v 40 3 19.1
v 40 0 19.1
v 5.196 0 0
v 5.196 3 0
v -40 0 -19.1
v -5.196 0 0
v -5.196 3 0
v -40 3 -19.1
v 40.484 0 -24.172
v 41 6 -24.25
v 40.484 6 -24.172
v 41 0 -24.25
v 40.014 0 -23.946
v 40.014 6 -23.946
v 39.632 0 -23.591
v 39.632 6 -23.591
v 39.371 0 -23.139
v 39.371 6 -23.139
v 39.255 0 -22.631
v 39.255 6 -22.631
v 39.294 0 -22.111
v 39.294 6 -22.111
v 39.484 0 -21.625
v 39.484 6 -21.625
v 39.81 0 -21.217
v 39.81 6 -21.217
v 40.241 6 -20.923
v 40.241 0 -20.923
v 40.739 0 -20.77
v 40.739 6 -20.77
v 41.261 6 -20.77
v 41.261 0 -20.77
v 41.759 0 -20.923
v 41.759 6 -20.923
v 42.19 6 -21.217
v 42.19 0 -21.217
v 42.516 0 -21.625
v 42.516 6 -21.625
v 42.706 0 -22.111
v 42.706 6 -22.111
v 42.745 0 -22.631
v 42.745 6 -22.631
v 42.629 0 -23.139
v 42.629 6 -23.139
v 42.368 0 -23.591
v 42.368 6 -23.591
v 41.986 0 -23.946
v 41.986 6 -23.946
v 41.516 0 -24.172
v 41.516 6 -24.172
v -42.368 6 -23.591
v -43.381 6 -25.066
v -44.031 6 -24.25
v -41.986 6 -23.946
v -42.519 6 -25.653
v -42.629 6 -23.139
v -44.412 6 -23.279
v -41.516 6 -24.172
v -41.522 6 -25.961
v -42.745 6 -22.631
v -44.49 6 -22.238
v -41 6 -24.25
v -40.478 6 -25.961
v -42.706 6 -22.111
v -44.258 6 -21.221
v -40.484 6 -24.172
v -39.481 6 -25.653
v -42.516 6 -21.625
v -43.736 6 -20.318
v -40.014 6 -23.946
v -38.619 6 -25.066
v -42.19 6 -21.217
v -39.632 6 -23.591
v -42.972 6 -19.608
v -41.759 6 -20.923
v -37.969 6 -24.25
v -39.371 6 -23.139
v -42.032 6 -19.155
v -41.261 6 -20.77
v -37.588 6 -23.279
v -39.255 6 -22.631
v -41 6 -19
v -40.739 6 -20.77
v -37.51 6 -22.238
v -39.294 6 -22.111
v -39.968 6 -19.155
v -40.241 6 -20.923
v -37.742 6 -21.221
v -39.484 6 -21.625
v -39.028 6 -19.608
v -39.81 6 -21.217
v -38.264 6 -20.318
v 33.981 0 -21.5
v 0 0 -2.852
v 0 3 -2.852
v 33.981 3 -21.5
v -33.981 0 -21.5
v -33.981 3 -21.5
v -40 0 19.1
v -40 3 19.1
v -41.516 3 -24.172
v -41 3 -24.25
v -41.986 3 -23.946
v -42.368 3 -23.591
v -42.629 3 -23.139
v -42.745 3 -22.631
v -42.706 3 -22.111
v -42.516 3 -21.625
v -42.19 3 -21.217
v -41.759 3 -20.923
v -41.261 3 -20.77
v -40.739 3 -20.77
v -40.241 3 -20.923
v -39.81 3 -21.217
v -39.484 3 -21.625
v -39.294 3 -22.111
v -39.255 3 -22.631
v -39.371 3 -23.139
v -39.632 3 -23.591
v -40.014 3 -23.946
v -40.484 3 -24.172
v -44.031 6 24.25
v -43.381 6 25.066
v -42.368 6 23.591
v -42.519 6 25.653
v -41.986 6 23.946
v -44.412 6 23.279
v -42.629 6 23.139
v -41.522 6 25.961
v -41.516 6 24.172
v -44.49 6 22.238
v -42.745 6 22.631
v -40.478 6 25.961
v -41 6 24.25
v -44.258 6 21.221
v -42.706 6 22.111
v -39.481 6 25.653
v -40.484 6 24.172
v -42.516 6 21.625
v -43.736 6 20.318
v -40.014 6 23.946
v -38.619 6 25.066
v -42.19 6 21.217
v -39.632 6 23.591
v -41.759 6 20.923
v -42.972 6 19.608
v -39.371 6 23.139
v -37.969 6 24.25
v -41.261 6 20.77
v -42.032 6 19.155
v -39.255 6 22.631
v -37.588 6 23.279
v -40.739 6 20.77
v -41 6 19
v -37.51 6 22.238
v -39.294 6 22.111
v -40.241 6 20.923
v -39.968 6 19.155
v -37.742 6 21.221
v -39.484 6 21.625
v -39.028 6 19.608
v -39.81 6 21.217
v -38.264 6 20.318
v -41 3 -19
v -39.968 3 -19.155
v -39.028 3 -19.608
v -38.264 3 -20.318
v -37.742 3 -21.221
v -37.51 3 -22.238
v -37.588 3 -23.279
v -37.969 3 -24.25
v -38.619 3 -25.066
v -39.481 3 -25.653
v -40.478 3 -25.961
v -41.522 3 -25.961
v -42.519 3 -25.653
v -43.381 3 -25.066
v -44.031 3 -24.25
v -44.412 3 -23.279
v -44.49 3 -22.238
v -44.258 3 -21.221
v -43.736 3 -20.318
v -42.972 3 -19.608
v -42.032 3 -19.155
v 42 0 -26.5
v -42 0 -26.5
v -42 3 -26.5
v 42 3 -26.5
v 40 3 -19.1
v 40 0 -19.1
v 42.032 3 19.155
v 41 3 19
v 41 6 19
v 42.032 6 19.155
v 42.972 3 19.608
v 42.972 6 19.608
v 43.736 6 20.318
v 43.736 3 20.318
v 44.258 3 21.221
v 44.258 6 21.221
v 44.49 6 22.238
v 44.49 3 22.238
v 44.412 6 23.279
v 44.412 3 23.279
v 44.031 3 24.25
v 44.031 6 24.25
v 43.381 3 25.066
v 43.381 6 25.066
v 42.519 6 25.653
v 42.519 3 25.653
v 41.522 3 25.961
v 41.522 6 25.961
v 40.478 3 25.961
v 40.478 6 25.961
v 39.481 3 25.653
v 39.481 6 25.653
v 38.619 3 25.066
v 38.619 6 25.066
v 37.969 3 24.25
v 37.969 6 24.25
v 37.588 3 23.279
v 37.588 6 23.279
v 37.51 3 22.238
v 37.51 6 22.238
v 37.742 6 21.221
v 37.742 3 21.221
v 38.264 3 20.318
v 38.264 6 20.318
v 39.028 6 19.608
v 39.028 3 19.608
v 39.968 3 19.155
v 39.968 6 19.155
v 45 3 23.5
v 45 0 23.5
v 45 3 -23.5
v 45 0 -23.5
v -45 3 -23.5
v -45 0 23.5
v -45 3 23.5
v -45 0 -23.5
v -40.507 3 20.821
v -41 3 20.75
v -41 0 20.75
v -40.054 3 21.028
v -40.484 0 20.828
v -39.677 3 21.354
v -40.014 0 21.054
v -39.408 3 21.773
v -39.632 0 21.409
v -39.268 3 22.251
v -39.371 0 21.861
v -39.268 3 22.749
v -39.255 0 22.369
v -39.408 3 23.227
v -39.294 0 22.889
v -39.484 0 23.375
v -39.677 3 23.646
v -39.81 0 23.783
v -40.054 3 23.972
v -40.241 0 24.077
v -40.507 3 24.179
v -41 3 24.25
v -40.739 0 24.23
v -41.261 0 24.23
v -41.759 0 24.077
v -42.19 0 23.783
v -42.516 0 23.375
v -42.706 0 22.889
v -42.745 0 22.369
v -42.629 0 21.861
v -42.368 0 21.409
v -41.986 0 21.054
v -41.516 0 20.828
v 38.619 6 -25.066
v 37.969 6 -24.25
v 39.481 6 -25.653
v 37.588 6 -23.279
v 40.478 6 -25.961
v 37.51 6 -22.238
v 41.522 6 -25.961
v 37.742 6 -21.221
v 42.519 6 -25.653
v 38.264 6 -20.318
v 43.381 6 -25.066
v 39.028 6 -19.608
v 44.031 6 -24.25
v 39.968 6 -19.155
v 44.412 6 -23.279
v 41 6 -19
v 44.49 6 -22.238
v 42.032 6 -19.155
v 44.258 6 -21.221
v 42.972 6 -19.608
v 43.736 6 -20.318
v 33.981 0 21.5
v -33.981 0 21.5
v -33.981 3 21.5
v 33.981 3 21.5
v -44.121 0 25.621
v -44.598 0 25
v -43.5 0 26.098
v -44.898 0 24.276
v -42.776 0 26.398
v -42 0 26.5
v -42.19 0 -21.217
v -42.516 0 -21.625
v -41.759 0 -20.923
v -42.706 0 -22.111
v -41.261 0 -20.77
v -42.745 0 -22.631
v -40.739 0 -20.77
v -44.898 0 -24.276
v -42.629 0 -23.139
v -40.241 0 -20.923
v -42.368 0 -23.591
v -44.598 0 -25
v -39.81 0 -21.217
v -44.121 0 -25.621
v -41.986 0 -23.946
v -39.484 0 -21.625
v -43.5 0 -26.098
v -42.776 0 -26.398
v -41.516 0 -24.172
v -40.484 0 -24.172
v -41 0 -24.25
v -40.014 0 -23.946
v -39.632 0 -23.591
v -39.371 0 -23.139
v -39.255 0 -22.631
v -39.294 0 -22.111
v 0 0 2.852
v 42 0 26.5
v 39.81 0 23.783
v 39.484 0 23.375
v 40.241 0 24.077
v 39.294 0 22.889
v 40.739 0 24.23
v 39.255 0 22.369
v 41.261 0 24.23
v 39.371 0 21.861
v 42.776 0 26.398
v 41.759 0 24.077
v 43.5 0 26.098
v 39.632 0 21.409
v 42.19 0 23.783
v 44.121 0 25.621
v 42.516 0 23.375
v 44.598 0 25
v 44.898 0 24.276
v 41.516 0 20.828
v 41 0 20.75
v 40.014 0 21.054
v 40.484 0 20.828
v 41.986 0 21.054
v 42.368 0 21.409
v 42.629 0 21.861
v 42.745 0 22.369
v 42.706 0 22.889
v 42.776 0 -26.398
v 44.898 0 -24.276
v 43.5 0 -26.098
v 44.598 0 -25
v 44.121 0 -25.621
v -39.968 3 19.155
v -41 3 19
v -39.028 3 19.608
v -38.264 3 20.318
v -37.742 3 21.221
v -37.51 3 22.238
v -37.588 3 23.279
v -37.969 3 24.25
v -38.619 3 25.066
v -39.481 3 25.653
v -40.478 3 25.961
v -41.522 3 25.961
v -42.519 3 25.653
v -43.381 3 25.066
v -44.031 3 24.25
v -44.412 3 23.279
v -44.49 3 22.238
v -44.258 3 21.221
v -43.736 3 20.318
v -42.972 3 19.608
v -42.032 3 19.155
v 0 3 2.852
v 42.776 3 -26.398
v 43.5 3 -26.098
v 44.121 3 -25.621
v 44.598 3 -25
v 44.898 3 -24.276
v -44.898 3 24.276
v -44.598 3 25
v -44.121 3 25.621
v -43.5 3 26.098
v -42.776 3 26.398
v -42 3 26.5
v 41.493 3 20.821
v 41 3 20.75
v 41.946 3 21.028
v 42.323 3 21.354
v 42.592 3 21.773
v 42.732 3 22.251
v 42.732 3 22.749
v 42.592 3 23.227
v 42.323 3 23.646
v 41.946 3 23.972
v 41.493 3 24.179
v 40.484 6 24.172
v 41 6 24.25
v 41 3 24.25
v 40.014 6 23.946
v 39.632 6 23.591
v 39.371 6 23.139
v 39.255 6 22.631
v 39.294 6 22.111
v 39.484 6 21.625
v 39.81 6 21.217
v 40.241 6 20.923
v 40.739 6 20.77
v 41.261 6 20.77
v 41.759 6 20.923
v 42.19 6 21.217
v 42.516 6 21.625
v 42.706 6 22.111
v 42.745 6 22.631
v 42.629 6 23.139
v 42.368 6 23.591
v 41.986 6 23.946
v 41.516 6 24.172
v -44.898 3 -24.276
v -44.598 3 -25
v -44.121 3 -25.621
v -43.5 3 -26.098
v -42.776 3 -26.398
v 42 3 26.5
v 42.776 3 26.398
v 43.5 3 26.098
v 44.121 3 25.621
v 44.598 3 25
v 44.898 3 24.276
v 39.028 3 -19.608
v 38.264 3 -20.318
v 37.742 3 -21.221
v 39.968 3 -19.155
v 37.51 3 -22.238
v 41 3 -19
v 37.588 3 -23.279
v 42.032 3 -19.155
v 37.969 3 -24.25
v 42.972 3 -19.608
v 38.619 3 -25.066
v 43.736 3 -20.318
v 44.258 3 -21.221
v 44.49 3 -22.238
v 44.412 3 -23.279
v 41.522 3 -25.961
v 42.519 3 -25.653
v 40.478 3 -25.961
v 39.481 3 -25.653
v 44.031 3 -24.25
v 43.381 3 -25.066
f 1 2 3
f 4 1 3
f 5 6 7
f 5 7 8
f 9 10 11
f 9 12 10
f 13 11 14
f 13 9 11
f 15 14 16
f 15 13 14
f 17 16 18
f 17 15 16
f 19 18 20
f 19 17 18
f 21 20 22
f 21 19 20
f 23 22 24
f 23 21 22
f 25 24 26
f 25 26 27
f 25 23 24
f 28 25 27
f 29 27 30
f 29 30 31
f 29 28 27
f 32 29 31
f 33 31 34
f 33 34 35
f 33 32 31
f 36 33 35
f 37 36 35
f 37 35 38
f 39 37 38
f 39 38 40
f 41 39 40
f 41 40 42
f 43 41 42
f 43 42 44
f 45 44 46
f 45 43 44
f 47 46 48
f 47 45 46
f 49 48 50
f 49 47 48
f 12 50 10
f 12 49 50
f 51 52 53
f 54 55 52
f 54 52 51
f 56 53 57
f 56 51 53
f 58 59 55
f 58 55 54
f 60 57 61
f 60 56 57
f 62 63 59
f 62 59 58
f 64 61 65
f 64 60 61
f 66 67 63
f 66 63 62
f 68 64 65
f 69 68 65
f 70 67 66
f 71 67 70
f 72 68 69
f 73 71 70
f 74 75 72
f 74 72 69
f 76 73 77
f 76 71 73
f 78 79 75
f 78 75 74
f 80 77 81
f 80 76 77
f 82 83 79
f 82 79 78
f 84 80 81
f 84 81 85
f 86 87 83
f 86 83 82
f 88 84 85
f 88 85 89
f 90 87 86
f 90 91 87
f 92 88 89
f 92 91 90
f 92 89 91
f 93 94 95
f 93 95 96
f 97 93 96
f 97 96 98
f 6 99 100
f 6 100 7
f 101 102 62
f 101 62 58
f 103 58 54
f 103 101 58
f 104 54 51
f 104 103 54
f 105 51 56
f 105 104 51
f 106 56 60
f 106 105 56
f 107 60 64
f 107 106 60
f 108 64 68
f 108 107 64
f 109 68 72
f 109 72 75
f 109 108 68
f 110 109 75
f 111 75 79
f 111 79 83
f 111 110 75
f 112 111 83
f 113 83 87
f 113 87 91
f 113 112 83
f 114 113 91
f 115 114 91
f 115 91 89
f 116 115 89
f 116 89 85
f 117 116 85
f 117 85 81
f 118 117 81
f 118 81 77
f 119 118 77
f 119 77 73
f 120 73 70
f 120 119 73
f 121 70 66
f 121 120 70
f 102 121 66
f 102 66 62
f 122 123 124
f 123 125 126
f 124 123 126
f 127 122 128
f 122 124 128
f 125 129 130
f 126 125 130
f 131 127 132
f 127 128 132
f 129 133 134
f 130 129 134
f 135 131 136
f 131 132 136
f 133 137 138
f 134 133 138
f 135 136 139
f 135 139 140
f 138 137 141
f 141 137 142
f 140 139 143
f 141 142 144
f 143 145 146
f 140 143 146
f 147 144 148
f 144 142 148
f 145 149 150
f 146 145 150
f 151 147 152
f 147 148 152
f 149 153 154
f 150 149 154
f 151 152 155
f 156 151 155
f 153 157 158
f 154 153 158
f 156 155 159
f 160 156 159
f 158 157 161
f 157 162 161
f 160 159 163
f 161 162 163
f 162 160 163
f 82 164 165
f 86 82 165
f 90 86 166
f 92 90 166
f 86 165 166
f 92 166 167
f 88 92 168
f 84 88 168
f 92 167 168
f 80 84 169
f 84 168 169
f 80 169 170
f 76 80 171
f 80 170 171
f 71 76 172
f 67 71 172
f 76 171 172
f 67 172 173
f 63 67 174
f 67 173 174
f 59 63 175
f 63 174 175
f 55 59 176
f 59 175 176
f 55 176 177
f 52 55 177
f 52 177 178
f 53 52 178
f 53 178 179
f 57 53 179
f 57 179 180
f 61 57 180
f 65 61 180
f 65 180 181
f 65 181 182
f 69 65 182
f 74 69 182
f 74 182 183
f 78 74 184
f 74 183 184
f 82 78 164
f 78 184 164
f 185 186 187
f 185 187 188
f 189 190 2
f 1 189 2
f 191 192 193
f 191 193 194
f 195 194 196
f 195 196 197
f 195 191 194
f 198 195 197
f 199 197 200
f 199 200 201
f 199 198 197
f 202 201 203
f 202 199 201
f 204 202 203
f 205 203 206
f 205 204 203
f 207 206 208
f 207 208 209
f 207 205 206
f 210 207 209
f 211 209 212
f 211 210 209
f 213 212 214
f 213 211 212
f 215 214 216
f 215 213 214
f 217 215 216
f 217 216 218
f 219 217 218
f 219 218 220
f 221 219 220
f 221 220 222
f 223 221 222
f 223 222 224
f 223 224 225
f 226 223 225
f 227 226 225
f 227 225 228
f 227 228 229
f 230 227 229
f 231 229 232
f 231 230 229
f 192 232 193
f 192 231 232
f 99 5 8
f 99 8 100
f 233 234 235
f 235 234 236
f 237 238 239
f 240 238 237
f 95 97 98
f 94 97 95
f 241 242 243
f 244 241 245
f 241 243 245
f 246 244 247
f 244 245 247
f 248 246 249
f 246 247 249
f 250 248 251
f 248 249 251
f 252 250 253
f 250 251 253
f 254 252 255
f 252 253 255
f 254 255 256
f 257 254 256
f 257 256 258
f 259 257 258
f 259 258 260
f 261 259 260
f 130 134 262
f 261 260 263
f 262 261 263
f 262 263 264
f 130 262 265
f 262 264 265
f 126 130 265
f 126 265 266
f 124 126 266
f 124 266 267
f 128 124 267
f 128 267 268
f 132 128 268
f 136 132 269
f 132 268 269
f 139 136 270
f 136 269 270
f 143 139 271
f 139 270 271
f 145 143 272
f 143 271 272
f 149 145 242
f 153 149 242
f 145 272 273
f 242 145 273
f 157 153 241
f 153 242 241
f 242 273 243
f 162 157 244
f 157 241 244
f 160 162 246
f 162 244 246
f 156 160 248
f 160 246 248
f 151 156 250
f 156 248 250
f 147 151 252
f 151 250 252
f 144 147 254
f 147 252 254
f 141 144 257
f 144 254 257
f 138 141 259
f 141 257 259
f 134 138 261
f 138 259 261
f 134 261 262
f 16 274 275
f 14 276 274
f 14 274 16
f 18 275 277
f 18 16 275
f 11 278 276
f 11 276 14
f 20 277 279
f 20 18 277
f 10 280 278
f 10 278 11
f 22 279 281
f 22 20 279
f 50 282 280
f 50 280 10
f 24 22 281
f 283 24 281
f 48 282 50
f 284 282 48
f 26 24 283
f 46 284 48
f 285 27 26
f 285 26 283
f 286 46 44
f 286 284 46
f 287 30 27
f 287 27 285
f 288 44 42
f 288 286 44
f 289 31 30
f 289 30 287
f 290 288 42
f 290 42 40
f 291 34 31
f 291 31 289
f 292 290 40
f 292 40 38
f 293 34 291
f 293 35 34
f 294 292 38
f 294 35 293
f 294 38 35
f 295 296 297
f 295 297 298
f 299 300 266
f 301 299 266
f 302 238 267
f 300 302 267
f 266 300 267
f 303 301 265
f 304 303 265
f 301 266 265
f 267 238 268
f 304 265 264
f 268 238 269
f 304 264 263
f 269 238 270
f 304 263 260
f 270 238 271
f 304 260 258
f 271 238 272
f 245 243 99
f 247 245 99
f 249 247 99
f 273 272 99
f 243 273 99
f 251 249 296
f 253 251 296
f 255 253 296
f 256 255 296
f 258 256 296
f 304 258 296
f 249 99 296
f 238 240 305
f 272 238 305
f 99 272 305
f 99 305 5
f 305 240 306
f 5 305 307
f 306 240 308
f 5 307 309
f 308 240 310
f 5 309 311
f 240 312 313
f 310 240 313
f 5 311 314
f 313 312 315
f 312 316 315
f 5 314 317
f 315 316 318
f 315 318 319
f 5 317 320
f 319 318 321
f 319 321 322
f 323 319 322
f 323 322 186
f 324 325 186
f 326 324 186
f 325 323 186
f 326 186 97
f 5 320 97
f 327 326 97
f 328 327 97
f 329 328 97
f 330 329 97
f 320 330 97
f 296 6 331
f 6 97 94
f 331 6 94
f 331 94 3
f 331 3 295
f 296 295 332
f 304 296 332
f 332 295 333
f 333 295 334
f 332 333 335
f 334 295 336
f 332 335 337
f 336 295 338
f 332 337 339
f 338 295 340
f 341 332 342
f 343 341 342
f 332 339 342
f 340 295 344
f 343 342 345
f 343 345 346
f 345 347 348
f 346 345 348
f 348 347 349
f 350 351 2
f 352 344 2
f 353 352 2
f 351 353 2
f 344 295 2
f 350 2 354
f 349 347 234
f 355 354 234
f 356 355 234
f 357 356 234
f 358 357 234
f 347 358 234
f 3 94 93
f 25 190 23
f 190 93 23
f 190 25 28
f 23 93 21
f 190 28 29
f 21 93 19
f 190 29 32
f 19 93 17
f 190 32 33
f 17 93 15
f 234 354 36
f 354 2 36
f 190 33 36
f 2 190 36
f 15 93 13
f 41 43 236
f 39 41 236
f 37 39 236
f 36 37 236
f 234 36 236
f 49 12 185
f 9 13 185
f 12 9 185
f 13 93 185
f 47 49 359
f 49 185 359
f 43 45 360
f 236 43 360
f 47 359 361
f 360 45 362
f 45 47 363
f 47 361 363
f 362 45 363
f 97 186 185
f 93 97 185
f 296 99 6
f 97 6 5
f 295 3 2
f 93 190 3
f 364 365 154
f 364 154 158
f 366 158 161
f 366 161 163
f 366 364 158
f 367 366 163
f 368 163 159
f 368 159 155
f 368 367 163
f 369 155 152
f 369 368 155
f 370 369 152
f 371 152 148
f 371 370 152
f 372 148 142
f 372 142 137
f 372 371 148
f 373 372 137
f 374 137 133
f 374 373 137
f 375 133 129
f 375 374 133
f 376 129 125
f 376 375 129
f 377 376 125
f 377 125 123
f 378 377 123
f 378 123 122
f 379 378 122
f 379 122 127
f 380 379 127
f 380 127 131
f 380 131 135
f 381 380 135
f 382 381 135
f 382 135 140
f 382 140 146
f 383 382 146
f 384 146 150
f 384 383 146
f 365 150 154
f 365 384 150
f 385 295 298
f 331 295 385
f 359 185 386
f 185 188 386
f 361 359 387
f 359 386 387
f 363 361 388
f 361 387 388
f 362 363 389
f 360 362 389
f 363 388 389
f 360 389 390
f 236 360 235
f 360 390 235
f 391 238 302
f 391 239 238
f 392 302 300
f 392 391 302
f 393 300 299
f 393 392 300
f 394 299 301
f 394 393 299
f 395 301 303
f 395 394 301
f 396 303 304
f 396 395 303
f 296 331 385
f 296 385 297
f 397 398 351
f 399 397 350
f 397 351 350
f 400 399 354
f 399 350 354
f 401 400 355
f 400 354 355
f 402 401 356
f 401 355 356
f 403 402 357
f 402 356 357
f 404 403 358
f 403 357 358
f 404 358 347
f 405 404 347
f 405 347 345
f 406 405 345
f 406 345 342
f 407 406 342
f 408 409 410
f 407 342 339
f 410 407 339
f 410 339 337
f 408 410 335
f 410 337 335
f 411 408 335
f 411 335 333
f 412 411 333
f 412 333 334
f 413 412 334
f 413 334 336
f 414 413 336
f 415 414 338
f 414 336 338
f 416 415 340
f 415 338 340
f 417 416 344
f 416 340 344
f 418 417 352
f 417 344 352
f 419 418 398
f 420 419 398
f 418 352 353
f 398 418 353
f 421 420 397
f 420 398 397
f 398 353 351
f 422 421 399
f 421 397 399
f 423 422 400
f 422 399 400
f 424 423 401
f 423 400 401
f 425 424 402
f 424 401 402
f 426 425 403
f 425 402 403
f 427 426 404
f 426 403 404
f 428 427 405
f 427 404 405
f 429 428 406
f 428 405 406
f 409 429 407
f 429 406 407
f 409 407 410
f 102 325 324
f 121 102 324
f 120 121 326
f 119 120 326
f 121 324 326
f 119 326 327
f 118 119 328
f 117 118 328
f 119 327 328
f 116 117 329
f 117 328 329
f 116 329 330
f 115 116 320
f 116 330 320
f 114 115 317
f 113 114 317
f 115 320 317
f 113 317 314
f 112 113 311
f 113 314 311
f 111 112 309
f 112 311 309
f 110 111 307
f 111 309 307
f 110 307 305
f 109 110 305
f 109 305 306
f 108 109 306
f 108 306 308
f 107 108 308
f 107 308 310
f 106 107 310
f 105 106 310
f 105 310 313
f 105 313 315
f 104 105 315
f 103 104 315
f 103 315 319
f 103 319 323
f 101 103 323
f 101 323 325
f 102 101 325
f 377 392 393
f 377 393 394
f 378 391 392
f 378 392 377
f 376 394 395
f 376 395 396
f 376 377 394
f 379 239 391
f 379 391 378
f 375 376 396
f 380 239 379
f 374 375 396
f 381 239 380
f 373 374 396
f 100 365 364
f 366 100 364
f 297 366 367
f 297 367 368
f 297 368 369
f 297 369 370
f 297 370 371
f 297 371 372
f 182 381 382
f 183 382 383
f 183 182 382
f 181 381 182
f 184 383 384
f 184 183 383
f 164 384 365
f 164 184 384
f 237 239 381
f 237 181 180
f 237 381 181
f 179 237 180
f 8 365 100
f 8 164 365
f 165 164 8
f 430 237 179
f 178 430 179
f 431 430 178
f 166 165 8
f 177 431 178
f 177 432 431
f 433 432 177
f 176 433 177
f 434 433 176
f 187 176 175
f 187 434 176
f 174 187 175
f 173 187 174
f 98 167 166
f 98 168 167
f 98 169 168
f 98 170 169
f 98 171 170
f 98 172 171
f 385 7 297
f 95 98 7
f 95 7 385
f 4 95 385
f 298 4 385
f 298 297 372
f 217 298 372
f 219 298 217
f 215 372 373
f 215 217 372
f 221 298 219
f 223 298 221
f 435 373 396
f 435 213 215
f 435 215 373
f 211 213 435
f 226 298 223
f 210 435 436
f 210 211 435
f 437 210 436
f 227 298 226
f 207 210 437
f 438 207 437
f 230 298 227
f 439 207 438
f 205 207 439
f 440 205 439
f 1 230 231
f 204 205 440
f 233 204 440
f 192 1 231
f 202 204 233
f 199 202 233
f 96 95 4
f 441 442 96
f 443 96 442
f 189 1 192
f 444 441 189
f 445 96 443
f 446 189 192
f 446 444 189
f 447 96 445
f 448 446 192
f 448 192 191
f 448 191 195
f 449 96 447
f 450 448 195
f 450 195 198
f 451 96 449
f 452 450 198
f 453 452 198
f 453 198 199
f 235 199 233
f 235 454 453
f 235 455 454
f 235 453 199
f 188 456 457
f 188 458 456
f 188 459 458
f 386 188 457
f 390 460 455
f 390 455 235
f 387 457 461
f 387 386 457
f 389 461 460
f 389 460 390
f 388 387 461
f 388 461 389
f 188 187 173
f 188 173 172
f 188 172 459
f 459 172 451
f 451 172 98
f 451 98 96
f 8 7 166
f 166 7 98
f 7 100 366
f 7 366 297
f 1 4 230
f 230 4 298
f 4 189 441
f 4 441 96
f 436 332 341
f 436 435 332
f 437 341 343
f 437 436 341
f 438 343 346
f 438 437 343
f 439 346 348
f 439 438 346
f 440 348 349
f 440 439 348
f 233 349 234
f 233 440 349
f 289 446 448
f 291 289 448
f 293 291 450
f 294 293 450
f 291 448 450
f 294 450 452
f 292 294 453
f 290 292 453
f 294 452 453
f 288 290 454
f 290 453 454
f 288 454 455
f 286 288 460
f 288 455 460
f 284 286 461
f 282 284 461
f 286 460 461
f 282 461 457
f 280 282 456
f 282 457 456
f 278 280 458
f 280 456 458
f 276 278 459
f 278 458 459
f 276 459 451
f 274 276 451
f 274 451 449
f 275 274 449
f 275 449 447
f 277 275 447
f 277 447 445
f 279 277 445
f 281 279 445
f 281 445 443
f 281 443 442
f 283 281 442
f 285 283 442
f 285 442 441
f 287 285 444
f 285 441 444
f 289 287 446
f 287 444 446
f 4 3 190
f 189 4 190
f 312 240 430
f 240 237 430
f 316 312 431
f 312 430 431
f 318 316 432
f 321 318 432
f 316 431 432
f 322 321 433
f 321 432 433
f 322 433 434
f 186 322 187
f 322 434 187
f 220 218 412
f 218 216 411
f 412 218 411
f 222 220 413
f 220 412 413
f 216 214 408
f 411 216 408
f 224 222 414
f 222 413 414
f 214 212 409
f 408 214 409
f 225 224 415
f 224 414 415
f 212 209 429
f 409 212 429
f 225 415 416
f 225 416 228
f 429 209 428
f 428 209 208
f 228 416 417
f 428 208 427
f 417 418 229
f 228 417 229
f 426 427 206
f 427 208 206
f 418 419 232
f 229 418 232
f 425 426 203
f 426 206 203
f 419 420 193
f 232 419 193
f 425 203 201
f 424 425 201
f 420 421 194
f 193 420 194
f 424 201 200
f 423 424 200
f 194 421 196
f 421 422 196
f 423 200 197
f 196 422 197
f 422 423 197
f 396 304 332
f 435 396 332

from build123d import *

# Parameters (mm, degrees)
CROQUIS1_W              = 90
CROQUIS1_H              = 53
SALIENTE_EXTRUIR1_DEPTH = 3
CROQUIS2_R              = 1.75
CORTAR_EXTRUIR1_DEPTH   = 53.309177015
CROQUIS3_R              = 3.5
CROQUIS3_R_2            = 1.75
SALIENTE_EXTRUIR2_DEPTH = 3
REDONDEO1_R             = 3
CORTAR_EXTRUIR2_DEPTH   = 53.566624392


with BuildPart() as part:
    # Croquis1 → Saliente-Extruir1 (new body)
    with BuildSketch(Plane(origin=(0, 0, 0), x_dir=(1, 0, 0), z_dir=(0, 1, 0))):
        Rectangle(CROQUIS1_W, CROQUIS1_H)
    extrude(amount=SALIENTE_EXTRUIR1_DEPTH)

    # Croquis2 → Cortar-Extruir1 (cut, through all)
    with BuildSketch(Plane.XZ):
        with Locations(Location((41, -22.5, 0), (0, 0, 270))):
            Circle(CROQUIS2_R)
        with Locations(Location((41, 22.5, 0), (0, 0, 270))):
            Circle(CROQUIS2_R)
        with Locations(Location((-41, 22.5, 0), (0, 0, 270))):
            Circle(CROQUIS2_R)
        with Locations(Location((-41, -22.5, 0), (0, 0, 270))):
            Circle(CROQUIS2_R)
    extrude(amount=-CORTAR_EXTRUIR1_DEPTH, mode=Mode.SUBTRACT)

    # Croquis3 → Saliente-Extruir2 (add)
    # profile 1 of 2: a face of its own
    with BuildSketch(Plane(origin=(0, 3, 0), x_dir=(1, 0, 0), z_dir=(0, 1, 0))):
        with Locations(Location((41, 22.5, 0), (0, 0, 270))):
            Circle(CROQUIS3_R)
        with Locations(Location((41, 22.5, 0), (0, 0, 90))):
            Circle(CROQUIS3_R_2, mode=Mode.SUBTRACT)
    # profile 2 of 2: a face of its own
    with BuildSketch(Plane(origin=(0, 3, 0), x_dir=(1, 0, 0), z_dir=(0, 1, 0))):
        with Locations(Location((-41, 22.5, 0), (0, 0, 270))):
            Circle(CROQUIS3_R)
        with Locations(Location((-41, 22.5, 0), (0, 0, 90))):
            Circle(CROQUIS3_R_2, mode=Mode.SUBTRACT)
    saliente_extruir2 = extrude(amount=SALIENTE_EXTRUIR2_DEPTH)

    # Simetría1: Saliente-Extruir2 across plane
    add(saliente_extruir2.mirror(Plane.XY))

    # Redondeo1
    redondeo1_edges = [part.edges().sort_by_distance(p)[0] for p in [
        (-45, 1.5, -26.5),
        (45, 1.5, -26.5),
        (45, 1.5, 26.5),
        (-45, 1.5, 26.5),
    ]]
    fillet(redondeo1_edges, radius=REDONDEO1_R)

    # Croquis4 → Cortar-Extruir2 (cut, through all)
    with BuildSketch(Plane.XZ):
        Polygon((33.981328373, 21.5), (0, 2.851710039), (-33.981328373, 21.5), align=None)
        Polygon((-40, 19.099509473), (-5.196449405, 0), (-40, -19.099509473), align=None)
        Polygon((40, 19.099509473), (5.196449405, 0), (40, -19.099509473), align=None)
        Polygon((33.981328373, -21.5), (-33.981328373, -21.5), (0, -2.851710039), align=None)
    extrude(amount=-CORTAR_EXTRUIR2_DEPTH, mode=Mode.SUBTRACT)


solid = part.part
